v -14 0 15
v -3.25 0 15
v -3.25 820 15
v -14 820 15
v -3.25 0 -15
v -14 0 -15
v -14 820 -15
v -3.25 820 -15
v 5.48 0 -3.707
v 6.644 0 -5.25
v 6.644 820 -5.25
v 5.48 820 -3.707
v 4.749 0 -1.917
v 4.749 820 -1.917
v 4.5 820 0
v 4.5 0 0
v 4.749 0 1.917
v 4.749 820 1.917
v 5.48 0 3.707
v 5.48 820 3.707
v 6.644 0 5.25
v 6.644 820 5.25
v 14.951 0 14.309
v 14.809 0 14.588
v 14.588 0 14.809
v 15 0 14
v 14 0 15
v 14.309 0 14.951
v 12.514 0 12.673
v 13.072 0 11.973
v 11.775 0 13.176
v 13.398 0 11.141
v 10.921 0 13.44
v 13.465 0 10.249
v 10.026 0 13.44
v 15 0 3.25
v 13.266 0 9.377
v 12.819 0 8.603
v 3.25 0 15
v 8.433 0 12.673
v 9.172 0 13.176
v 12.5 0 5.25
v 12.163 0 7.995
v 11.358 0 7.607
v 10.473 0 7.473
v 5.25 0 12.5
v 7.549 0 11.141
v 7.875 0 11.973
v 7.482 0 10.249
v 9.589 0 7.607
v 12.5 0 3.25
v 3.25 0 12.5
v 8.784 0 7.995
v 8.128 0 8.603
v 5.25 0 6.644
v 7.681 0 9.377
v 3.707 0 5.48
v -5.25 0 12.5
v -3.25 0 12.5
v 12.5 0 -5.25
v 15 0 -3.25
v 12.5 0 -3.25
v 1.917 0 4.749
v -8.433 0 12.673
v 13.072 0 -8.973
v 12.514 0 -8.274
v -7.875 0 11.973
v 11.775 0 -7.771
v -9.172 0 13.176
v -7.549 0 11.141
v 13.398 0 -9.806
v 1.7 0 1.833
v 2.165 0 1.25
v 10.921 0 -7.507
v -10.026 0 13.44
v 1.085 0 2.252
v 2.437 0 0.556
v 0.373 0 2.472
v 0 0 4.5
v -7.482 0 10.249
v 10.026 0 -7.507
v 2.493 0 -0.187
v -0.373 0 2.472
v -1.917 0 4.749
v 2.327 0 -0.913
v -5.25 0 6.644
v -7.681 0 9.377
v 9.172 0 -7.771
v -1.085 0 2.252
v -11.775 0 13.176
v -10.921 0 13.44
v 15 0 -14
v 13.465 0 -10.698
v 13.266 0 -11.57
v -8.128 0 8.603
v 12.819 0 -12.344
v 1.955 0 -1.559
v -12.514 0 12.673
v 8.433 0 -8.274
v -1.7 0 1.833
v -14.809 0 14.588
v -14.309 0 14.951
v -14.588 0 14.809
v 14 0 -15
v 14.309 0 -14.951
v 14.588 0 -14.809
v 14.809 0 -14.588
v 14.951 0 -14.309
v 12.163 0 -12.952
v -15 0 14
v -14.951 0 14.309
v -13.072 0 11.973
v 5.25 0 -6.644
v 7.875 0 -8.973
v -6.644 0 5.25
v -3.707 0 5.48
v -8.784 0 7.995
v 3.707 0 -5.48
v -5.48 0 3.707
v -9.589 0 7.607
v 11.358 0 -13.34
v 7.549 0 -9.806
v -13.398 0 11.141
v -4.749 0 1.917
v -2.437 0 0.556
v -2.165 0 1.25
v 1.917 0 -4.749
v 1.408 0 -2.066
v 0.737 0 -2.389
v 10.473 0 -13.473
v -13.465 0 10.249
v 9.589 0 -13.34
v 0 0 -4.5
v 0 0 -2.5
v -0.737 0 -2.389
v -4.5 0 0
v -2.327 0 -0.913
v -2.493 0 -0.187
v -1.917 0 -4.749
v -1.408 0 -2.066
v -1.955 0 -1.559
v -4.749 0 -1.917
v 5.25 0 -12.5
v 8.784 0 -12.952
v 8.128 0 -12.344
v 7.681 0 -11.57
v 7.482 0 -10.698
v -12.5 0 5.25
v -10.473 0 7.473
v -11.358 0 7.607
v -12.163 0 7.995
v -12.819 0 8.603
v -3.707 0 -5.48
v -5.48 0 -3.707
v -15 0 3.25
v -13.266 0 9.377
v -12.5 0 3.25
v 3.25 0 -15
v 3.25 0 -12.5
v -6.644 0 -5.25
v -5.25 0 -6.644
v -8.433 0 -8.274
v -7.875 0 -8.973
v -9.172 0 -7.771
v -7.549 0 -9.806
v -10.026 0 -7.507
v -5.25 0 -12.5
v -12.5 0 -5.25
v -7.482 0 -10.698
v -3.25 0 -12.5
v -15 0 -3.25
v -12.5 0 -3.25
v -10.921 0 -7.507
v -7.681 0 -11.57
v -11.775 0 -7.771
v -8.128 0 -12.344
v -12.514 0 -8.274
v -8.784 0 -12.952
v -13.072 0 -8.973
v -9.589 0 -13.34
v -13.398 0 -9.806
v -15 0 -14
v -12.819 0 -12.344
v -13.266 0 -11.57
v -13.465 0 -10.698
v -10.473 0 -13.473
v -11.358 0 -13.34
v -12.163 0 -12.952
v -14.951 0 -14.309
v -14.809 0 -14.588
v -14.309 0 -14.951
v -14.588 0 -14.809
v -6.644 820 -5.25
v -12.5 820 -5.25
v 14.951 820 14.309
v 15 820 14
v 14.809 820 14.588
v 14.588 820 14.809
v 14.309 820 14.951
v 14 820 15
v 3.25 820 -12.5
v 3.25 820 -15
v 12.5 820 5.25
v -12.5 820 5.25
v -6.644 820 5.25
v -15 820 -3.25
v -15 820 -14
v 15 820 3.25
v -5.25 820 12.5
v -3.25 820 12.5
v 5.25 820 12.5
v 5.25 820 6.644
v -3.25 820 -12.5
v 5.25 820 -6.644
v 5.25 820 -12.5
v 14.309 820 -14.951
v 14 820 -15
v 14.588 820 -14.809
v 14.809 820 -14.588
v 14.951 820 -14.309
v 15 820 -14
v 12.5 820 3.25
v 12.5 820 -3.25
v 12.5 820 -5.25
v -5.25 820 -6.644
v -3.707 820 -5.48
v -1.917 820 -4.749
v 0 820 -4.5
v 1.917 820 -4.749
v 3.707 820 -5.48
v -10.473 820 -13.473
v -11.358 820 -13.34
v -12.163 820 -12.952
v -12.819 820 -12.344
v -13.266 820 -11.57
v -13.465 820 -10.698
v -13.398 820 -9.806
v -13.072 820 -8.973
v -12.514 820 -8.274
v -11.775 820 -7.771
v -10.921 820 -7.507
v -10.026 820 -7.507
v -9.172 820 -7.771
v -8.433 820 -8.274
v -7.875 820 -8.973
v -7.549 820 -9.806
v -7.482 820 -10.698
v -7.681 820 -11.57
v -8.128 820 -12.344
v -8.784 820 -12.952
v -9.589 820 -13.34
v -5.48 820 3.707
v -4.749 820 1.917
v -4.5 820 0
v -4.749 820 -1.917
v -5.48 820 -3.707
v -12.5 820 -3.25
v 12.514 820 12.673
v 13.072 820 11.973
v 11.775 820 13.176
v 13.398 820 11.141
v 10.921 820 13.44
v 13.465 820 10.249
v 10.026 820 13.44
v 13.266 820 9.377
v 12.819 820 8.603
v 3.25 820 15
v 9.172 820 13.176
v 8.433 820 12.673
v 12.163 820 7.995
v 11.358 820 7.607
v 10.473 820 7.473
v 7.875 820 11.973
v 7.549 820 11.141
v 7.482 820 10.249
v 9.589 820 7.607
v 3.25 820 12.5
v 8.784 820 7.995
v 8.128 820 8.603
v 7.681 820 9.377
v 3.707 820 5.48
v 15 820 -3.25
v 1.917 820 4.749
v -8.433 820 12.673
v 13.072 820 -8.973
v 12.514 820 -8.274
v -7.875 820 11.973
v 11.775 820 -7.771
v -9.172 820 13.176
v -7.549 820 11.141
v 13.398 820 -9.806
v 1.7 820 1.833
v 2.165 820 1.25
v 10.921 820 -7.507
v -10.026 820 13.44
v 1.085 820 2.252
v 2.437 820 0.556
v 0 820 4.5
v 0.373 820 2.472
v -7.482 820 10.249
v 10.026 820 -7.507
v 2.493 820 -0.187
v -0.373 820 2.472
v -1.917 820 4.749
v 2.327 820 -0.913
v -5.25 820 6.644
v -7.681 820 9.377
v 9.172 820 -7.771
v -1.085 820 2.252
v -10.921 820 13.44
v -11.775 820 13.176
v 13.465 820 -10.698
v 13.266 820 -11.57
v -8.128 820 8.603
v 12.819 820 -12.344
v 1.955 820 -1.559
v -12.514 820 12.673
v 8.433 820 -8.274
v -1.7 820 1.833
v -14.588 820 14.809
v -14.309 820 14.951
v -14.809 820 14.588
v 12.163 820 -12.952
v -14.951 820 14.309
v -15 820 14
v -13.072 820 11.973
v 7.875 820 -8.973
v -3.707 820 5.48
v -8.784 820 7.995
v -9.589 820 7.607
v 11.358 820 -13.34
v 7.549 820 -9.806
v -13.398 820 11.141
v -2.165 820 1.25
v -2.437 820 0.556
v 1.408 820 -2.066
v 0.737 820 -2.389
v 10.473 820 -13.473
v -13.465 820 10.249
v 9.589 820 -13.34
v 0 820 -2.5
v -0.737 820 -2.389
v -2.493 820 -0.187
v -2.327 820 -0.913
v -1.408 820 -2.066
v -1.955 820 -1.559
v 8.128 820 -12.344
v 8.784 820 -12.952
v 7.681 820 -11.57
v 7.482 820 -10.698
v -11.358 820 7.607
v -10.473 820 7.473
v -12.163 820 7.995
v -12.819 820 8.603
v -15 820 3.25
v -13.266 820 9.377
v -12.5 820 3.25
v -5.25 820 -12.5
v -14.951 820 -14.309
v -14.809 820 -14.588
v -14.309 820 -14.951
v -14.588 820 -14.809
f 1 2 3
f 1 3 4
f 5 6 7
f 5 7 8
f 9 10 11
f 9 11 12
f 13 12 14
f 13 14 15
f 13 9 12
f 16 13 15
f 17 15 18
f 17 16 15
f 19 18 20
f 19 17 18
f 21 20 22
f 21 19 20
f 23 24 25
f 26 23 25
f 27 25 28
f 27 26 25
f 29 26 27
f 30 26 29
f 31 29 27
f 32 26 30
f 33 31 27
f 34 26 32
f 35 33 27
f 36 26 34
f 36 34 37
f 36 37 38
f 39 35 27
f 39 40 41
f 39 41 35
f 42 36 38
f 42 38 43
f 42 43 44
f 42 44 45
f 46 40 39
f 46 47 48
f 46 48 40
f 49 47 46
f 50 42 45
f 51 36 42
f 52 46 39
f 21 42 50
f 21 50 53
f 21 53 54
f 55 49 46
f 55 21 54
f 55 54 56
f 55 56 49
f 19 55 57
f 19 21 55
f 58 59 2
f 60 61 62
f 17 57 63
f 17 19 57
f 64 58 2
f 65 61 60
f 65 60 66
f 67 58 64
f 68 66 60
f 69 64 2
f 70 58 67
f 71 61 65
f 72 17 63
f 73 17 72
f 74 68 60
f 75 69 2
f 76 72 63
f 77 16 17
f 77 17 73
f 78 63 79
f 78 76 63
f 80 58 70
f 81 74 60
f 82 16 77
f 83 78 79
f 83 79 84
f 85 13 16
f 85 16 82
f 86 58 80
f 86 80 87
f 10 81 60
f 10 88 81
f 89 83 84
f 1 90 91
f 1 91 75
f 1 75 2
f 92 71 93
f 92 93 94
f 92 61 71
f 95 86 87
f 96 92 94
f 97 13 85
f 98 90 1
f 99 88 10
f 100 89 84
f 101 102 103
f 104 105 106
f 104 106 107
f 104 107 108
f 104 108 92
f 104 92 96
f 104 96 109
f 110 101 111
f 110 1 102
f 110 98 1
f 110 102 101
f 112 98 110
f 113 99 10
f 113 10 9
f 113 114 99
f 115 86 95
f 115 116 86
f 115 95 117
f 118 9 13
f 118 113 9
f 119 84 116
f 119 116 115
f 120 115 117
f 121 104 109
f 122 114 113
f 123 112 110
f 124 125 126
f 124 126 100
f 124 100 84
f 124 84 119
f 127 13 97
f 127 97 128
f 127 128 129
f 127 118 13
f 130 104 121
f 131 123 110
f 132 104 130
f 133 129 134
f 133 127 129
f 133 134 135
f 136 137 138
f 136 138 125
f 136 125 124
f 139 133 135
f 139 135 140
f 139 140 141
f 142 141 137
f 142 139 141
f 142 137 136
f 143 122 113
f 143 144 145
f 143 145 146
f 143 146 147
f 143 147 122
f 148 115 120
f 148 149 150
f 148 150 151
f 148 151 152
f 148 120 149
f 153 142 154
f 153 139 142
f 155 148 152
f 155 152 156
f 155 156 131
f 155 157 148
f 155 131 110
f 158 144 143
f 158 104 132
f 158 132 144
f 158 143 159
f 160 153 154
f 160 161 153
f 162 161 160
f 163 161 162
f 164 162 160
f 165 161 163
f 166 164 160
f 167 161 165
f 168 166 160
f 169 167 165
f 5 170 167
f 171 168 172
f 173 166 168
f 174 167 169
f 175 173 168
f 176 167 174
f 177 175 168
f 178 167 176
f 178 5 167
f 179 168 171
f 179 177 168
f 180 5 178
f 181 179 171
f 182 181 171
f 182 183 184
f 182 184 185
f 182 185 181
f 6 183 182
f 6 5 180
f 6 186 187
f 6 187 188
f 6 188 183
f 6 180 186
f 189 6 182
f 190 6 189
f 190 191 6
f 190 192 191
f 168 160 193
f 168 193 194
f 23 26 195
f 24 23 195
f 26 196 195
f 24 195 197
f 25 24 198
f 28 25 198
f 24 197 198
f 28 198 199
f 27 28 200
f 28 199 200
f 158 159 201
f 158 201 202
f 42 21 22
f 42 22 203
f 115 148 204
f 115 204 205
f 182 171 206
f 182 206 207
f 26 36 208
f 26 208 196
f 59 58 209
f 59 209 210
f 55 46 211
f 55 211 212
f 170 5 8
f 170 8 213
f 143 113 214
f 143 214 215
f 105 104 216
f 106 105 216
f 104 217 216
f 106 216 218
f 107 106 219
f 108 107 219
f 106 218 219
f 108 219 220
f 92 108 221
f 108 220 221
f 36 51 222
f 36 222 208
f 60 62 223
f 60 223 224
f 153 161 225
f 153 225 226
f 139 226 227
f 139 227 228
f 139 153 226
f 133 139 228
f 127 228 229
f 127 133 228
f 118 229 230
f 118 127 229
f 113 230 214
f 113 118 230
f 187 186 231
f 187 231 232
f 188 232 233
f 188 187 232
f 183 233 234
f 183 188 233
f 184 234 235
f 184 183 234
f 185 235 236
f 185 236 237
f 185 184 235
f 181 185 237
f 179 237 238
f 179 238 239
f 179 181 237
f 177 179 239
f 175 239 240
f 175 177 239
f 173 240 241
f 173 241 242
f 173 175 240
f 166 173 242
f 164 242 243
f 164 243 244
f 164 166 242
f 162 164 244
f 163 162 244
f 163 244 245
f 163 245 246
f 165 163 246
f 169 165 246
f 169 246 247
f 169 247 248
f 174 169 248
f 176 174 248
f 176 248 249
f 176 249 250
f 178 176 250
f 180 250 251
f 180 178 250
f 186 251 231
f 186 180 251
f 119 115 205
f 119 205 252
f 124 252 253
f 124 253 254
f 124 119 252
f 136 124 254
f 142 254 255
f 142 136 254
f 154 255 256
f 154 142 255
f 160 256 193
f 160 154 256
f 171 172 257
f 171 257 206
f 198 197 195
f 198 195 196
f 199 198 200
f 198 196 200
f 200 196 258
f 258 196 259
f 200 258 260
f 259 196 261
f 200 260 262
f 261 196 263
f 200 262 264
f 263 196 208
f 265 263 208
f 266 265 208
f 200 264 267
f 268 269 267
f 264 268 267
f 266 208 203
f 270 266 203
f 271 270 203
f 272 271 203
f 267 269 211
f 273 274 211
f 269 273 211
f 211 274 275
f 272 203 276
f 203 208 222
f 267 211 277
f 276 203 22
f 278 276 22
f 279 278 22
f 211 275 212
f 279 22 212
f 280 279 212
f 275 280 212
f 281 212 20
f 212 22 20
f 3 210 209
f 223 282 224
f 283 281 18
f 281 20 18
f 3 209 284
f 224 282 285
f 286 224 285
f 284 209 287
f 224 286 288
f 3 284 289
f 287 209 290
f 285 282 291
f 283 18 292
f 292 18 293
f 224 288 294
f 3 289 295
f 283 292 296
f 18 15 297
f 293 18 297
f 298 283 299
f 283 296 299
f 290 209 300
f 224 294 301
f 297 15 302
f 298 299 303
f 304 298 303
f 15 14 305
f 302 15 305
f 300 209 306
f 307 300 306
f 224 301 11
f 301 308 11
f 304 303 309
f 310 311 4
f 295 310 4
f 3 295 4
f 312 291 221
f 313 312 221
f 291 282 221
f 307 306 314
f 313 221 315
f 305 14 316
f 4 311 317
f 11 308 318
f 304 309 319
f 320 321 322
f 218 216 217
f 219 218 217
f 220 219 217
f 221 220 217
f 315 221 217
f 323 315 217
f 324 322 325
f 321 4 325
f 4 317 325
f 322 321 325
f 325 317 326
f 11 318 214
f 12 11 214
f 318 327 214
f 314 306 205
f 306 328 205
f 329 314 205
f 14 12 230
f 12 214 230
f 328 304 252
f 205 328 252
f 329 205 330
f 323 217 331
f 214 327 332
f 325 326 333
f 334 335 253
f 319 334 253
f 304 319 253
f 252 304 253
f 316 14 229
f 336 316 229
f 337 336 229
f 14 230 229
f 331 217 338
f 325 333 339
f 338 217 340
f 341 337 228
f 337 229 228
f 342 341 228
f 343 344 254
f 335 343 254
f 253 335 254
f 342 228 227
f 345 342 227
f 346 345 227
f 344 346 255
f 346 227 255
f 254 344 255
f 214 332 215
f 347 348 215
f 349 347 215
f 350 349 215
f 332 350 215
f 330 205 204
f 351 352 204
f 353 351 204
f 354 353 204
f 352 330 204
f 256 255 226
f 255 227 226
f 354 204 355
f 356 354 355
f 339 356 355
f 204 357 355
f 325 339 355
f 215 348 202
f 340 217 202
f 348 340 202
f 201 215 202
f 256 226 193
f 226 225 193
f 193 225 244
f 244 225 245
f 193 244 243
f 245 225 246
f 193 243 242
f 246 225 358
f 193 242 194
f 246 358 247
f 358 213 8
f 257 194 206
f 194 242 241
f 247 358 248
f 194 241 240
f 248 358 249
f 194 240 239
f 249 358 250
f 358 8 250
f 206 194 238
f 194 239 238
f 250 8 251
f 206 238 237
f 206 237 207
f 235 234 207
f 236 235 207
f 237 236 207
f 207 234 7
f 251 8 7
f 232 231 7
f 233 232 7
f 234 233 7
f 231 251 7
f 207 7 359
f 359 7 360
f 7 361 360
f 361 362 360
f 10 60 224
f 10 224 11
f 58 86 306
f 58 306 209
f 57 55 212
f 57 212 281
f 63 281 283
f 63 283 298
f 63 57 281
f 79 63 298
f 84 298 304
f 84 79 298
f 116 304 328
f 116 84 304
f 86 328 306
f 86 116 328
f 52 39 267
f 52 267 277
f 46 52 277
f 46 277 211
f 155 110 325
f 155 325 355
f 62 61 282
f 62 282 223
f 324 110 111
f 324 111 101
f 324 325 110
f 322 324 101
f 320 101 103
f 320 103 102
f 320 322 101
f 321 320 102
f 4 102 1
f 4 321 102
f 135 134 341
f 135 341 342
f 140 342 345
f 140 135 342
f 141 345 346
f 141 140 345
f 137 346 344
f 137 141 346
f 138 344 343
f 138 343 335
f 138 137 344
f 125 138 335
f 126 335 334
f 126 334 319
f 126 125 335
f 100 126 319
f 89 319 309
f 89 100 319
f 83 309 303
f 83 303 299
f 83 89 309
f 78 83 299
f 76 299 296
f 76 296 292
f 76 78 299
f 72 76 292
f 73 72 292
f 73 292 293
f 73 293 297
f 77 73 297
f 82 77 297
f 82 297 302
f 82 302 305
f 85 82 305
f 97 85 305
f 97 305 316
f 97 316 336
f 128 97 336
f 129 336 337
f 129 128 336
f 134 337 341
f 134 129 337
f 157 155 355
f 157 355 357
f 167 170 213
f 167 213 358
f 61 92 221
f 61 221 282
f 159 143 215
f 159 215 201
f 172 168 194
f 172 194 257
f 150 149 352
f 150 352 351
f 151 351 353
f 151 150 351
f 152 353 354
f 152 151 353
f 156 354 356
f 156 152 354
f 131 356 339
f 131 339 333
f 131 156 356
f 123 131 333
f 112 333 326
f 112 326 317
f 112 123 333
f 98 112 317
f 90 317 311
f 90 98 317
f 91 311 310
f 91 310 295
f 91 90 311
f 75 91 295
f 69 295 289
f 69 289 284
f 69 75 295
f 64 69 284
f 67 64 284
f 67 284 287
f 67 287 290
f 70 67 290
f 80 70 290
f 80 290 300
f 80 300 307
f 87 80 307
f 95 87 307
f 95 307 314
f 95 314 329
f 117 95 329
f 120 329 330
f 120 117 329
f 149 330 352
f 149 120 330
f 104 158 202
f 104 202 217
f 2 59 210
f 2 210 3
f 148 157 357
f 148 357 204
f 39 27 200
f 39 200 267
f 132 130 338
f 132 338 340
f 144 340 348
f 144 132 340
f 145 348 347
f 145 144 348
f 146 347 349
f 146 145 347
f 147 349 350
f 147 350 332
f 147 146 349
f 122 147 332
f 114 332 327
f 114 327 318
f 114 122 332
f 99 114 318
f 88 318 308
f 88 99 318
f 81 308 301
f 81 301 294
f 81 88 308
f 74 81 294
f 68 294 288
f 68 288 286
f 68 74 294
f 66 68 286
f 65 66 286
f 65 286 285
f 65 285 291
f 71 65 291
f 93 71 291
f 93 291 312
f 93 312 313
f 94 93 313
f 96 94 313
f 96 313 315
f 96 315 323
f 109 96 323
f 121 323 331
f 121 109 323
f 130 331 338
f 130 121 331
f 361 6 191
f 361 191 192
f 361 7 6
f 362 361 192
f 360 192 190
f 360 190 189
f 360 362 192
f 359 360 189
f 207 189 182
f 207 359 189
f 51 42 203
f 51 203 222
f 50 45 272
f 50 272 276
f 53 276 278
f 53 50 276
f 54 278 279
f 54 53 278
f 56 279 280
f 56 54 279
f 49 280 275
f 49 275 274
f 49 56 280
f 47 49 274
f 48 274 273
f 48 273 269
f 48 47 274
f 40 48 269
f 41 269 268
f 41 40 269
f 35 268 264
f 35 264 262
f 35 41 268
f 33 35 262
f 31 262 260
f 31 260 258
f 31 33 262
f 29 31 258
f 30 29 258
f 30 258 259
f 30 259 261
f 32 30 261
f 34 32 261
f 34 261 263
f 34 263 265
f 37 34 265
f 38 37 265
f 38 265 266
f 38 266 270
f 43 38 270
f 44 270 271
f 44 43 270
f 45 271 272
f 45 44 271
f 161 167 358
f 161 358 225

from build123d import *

# Parameters (mm, degrees)
SKETCH_1_R      = 2.5
SKETCH_1_R_2    = 3
EXTRUDE_1_DEPTH = 820
FILLET_1_R      = 1


with BuildPart() as part:
    # 草圖1 → 填料-伸長1 (new body)
    with BuildSketch(Plane(origin=(0, 0, 0), x_dir=(1, 0, 0), z_dir=(0, 1, 0))):
        with BuildLine():
            Line((5.25, 6.643928679), (5.25, 12.5))
            Line((5.25, 12.5), (3.25, 12.5))
            Line((3.25, 12.5), (3.25, 15))
            Line((3.25, 15), (15, 15))
            Line((15, 15), (15, 3.25))
            Line((15, 3.25), (12.5, 3.25))
            Line((12.5, 3.25), (12.5, 5.25))
            Line((12.5, 5.25), (6.643928679, 5.25))
            ThreePointArc((6.643928679, 5.25), (4.5, 0), (6.643928679, -5.25))
            Line((6.643928679, -5.25), (12.5, -5.25))
            Line((12.5, -5.25), (12.5, -3.25))
            Line((12.5, -3.25), (15, -3.25))
            Line((15, -3.25), (15, -15))
            Line((15, -15), (3.25, -15))
            Line((3.25, -15), (3.25, -12.5))
            Line((3.25, -12.5), (5.25, -12.5))
            Line((5.25, -12.5), (5.25, -6.643928679))
            ThreePointArc((5.25, -6.643928679), (0, -4.5), (-5.25, -6.643928679))
            Line((-5.25, -6.643928679), (-5.25, -12.5))
            Line((-5.25, -12.5), (-3.25, -12.5))
            Line((-3.25, -12.5), (-3.25, -15))
            Line((-3.25, -15), (-15, -15))
            Line((-15, -15), (-15, -3.25))
            Line((-15, -3.25), (-12.5, -3.25))
            Line((-12.5, -3.25), (-12.5, -5.25))
            Line((-12.5, -5.25), (-6.643928679, -5.25))
            ThreePointArc((-6.643928679, -5.25), (-4.5, 0), (-6.643928679, 5.25))
            Line((-6.643928679, 5.25), (-12.5, 5.25))
            Line((-12.5, 5.25), (-12.5, 3.25))
            Line((-12.5, 3.25), (-15, 3.25))
            Line((-15, 3.25), (-15, 15))
            Line((-15, 15), (-3.25, 15))
            Line((-3.25, 15), (-3.25, 12.5))
            Line((-3.25, 12.5), (-5.25, 12.5))
            Line((-5.25, 12.5), (-5.25, 6.643928679))
            ThreePointArc((-5.25, 6.643928679), (0, 4.5), (5.25, 6.643928679))
        make_face()
        with Locations(Location((0, 0, 0), (0, 0, 90))):
            Circle(SKETCH_1_R, mode=Mode.SUBTRACT)
        with Locations(Location((10.47348217, 10.47348217, 0), (0, 0, 90))):
            Circle(SKETCH_1_R_2, mode=Mode.SUBTRACT)
        with Locations(Location((-10.47348217, 10.47348217, 0), (0, 0, 90))):
            Circle(SKETCH_1_R_2, mode=Mode.SUBTRACT)
        with Locations(Location((-10.47348217, -10.47348217, 0), (0, 0, 90))):
            Circle(SKETCH_1_R_2, mode=Mode.SUBTRACT)
        with Locations(Location((10.47348217, -10.47348217, 0), (0, 0, 90))):
            Circle(SKETCH_1_R_2, mode=Mode.SUBTRACT)
    extrude(amount=EXTRUDE_1_DEPTH)

    # 圓角1
    fillet_1_edges = [part.edges().sort_by_distance(p)[0] for p in [
        (-15, 410, -15),
        (15, 410, -15),
        (15, 410, 15),
        (-15, 410, 15),
    ]]
    fillet(fillet_1_edges, radius=FILLET_1_R)


solid = part.part
